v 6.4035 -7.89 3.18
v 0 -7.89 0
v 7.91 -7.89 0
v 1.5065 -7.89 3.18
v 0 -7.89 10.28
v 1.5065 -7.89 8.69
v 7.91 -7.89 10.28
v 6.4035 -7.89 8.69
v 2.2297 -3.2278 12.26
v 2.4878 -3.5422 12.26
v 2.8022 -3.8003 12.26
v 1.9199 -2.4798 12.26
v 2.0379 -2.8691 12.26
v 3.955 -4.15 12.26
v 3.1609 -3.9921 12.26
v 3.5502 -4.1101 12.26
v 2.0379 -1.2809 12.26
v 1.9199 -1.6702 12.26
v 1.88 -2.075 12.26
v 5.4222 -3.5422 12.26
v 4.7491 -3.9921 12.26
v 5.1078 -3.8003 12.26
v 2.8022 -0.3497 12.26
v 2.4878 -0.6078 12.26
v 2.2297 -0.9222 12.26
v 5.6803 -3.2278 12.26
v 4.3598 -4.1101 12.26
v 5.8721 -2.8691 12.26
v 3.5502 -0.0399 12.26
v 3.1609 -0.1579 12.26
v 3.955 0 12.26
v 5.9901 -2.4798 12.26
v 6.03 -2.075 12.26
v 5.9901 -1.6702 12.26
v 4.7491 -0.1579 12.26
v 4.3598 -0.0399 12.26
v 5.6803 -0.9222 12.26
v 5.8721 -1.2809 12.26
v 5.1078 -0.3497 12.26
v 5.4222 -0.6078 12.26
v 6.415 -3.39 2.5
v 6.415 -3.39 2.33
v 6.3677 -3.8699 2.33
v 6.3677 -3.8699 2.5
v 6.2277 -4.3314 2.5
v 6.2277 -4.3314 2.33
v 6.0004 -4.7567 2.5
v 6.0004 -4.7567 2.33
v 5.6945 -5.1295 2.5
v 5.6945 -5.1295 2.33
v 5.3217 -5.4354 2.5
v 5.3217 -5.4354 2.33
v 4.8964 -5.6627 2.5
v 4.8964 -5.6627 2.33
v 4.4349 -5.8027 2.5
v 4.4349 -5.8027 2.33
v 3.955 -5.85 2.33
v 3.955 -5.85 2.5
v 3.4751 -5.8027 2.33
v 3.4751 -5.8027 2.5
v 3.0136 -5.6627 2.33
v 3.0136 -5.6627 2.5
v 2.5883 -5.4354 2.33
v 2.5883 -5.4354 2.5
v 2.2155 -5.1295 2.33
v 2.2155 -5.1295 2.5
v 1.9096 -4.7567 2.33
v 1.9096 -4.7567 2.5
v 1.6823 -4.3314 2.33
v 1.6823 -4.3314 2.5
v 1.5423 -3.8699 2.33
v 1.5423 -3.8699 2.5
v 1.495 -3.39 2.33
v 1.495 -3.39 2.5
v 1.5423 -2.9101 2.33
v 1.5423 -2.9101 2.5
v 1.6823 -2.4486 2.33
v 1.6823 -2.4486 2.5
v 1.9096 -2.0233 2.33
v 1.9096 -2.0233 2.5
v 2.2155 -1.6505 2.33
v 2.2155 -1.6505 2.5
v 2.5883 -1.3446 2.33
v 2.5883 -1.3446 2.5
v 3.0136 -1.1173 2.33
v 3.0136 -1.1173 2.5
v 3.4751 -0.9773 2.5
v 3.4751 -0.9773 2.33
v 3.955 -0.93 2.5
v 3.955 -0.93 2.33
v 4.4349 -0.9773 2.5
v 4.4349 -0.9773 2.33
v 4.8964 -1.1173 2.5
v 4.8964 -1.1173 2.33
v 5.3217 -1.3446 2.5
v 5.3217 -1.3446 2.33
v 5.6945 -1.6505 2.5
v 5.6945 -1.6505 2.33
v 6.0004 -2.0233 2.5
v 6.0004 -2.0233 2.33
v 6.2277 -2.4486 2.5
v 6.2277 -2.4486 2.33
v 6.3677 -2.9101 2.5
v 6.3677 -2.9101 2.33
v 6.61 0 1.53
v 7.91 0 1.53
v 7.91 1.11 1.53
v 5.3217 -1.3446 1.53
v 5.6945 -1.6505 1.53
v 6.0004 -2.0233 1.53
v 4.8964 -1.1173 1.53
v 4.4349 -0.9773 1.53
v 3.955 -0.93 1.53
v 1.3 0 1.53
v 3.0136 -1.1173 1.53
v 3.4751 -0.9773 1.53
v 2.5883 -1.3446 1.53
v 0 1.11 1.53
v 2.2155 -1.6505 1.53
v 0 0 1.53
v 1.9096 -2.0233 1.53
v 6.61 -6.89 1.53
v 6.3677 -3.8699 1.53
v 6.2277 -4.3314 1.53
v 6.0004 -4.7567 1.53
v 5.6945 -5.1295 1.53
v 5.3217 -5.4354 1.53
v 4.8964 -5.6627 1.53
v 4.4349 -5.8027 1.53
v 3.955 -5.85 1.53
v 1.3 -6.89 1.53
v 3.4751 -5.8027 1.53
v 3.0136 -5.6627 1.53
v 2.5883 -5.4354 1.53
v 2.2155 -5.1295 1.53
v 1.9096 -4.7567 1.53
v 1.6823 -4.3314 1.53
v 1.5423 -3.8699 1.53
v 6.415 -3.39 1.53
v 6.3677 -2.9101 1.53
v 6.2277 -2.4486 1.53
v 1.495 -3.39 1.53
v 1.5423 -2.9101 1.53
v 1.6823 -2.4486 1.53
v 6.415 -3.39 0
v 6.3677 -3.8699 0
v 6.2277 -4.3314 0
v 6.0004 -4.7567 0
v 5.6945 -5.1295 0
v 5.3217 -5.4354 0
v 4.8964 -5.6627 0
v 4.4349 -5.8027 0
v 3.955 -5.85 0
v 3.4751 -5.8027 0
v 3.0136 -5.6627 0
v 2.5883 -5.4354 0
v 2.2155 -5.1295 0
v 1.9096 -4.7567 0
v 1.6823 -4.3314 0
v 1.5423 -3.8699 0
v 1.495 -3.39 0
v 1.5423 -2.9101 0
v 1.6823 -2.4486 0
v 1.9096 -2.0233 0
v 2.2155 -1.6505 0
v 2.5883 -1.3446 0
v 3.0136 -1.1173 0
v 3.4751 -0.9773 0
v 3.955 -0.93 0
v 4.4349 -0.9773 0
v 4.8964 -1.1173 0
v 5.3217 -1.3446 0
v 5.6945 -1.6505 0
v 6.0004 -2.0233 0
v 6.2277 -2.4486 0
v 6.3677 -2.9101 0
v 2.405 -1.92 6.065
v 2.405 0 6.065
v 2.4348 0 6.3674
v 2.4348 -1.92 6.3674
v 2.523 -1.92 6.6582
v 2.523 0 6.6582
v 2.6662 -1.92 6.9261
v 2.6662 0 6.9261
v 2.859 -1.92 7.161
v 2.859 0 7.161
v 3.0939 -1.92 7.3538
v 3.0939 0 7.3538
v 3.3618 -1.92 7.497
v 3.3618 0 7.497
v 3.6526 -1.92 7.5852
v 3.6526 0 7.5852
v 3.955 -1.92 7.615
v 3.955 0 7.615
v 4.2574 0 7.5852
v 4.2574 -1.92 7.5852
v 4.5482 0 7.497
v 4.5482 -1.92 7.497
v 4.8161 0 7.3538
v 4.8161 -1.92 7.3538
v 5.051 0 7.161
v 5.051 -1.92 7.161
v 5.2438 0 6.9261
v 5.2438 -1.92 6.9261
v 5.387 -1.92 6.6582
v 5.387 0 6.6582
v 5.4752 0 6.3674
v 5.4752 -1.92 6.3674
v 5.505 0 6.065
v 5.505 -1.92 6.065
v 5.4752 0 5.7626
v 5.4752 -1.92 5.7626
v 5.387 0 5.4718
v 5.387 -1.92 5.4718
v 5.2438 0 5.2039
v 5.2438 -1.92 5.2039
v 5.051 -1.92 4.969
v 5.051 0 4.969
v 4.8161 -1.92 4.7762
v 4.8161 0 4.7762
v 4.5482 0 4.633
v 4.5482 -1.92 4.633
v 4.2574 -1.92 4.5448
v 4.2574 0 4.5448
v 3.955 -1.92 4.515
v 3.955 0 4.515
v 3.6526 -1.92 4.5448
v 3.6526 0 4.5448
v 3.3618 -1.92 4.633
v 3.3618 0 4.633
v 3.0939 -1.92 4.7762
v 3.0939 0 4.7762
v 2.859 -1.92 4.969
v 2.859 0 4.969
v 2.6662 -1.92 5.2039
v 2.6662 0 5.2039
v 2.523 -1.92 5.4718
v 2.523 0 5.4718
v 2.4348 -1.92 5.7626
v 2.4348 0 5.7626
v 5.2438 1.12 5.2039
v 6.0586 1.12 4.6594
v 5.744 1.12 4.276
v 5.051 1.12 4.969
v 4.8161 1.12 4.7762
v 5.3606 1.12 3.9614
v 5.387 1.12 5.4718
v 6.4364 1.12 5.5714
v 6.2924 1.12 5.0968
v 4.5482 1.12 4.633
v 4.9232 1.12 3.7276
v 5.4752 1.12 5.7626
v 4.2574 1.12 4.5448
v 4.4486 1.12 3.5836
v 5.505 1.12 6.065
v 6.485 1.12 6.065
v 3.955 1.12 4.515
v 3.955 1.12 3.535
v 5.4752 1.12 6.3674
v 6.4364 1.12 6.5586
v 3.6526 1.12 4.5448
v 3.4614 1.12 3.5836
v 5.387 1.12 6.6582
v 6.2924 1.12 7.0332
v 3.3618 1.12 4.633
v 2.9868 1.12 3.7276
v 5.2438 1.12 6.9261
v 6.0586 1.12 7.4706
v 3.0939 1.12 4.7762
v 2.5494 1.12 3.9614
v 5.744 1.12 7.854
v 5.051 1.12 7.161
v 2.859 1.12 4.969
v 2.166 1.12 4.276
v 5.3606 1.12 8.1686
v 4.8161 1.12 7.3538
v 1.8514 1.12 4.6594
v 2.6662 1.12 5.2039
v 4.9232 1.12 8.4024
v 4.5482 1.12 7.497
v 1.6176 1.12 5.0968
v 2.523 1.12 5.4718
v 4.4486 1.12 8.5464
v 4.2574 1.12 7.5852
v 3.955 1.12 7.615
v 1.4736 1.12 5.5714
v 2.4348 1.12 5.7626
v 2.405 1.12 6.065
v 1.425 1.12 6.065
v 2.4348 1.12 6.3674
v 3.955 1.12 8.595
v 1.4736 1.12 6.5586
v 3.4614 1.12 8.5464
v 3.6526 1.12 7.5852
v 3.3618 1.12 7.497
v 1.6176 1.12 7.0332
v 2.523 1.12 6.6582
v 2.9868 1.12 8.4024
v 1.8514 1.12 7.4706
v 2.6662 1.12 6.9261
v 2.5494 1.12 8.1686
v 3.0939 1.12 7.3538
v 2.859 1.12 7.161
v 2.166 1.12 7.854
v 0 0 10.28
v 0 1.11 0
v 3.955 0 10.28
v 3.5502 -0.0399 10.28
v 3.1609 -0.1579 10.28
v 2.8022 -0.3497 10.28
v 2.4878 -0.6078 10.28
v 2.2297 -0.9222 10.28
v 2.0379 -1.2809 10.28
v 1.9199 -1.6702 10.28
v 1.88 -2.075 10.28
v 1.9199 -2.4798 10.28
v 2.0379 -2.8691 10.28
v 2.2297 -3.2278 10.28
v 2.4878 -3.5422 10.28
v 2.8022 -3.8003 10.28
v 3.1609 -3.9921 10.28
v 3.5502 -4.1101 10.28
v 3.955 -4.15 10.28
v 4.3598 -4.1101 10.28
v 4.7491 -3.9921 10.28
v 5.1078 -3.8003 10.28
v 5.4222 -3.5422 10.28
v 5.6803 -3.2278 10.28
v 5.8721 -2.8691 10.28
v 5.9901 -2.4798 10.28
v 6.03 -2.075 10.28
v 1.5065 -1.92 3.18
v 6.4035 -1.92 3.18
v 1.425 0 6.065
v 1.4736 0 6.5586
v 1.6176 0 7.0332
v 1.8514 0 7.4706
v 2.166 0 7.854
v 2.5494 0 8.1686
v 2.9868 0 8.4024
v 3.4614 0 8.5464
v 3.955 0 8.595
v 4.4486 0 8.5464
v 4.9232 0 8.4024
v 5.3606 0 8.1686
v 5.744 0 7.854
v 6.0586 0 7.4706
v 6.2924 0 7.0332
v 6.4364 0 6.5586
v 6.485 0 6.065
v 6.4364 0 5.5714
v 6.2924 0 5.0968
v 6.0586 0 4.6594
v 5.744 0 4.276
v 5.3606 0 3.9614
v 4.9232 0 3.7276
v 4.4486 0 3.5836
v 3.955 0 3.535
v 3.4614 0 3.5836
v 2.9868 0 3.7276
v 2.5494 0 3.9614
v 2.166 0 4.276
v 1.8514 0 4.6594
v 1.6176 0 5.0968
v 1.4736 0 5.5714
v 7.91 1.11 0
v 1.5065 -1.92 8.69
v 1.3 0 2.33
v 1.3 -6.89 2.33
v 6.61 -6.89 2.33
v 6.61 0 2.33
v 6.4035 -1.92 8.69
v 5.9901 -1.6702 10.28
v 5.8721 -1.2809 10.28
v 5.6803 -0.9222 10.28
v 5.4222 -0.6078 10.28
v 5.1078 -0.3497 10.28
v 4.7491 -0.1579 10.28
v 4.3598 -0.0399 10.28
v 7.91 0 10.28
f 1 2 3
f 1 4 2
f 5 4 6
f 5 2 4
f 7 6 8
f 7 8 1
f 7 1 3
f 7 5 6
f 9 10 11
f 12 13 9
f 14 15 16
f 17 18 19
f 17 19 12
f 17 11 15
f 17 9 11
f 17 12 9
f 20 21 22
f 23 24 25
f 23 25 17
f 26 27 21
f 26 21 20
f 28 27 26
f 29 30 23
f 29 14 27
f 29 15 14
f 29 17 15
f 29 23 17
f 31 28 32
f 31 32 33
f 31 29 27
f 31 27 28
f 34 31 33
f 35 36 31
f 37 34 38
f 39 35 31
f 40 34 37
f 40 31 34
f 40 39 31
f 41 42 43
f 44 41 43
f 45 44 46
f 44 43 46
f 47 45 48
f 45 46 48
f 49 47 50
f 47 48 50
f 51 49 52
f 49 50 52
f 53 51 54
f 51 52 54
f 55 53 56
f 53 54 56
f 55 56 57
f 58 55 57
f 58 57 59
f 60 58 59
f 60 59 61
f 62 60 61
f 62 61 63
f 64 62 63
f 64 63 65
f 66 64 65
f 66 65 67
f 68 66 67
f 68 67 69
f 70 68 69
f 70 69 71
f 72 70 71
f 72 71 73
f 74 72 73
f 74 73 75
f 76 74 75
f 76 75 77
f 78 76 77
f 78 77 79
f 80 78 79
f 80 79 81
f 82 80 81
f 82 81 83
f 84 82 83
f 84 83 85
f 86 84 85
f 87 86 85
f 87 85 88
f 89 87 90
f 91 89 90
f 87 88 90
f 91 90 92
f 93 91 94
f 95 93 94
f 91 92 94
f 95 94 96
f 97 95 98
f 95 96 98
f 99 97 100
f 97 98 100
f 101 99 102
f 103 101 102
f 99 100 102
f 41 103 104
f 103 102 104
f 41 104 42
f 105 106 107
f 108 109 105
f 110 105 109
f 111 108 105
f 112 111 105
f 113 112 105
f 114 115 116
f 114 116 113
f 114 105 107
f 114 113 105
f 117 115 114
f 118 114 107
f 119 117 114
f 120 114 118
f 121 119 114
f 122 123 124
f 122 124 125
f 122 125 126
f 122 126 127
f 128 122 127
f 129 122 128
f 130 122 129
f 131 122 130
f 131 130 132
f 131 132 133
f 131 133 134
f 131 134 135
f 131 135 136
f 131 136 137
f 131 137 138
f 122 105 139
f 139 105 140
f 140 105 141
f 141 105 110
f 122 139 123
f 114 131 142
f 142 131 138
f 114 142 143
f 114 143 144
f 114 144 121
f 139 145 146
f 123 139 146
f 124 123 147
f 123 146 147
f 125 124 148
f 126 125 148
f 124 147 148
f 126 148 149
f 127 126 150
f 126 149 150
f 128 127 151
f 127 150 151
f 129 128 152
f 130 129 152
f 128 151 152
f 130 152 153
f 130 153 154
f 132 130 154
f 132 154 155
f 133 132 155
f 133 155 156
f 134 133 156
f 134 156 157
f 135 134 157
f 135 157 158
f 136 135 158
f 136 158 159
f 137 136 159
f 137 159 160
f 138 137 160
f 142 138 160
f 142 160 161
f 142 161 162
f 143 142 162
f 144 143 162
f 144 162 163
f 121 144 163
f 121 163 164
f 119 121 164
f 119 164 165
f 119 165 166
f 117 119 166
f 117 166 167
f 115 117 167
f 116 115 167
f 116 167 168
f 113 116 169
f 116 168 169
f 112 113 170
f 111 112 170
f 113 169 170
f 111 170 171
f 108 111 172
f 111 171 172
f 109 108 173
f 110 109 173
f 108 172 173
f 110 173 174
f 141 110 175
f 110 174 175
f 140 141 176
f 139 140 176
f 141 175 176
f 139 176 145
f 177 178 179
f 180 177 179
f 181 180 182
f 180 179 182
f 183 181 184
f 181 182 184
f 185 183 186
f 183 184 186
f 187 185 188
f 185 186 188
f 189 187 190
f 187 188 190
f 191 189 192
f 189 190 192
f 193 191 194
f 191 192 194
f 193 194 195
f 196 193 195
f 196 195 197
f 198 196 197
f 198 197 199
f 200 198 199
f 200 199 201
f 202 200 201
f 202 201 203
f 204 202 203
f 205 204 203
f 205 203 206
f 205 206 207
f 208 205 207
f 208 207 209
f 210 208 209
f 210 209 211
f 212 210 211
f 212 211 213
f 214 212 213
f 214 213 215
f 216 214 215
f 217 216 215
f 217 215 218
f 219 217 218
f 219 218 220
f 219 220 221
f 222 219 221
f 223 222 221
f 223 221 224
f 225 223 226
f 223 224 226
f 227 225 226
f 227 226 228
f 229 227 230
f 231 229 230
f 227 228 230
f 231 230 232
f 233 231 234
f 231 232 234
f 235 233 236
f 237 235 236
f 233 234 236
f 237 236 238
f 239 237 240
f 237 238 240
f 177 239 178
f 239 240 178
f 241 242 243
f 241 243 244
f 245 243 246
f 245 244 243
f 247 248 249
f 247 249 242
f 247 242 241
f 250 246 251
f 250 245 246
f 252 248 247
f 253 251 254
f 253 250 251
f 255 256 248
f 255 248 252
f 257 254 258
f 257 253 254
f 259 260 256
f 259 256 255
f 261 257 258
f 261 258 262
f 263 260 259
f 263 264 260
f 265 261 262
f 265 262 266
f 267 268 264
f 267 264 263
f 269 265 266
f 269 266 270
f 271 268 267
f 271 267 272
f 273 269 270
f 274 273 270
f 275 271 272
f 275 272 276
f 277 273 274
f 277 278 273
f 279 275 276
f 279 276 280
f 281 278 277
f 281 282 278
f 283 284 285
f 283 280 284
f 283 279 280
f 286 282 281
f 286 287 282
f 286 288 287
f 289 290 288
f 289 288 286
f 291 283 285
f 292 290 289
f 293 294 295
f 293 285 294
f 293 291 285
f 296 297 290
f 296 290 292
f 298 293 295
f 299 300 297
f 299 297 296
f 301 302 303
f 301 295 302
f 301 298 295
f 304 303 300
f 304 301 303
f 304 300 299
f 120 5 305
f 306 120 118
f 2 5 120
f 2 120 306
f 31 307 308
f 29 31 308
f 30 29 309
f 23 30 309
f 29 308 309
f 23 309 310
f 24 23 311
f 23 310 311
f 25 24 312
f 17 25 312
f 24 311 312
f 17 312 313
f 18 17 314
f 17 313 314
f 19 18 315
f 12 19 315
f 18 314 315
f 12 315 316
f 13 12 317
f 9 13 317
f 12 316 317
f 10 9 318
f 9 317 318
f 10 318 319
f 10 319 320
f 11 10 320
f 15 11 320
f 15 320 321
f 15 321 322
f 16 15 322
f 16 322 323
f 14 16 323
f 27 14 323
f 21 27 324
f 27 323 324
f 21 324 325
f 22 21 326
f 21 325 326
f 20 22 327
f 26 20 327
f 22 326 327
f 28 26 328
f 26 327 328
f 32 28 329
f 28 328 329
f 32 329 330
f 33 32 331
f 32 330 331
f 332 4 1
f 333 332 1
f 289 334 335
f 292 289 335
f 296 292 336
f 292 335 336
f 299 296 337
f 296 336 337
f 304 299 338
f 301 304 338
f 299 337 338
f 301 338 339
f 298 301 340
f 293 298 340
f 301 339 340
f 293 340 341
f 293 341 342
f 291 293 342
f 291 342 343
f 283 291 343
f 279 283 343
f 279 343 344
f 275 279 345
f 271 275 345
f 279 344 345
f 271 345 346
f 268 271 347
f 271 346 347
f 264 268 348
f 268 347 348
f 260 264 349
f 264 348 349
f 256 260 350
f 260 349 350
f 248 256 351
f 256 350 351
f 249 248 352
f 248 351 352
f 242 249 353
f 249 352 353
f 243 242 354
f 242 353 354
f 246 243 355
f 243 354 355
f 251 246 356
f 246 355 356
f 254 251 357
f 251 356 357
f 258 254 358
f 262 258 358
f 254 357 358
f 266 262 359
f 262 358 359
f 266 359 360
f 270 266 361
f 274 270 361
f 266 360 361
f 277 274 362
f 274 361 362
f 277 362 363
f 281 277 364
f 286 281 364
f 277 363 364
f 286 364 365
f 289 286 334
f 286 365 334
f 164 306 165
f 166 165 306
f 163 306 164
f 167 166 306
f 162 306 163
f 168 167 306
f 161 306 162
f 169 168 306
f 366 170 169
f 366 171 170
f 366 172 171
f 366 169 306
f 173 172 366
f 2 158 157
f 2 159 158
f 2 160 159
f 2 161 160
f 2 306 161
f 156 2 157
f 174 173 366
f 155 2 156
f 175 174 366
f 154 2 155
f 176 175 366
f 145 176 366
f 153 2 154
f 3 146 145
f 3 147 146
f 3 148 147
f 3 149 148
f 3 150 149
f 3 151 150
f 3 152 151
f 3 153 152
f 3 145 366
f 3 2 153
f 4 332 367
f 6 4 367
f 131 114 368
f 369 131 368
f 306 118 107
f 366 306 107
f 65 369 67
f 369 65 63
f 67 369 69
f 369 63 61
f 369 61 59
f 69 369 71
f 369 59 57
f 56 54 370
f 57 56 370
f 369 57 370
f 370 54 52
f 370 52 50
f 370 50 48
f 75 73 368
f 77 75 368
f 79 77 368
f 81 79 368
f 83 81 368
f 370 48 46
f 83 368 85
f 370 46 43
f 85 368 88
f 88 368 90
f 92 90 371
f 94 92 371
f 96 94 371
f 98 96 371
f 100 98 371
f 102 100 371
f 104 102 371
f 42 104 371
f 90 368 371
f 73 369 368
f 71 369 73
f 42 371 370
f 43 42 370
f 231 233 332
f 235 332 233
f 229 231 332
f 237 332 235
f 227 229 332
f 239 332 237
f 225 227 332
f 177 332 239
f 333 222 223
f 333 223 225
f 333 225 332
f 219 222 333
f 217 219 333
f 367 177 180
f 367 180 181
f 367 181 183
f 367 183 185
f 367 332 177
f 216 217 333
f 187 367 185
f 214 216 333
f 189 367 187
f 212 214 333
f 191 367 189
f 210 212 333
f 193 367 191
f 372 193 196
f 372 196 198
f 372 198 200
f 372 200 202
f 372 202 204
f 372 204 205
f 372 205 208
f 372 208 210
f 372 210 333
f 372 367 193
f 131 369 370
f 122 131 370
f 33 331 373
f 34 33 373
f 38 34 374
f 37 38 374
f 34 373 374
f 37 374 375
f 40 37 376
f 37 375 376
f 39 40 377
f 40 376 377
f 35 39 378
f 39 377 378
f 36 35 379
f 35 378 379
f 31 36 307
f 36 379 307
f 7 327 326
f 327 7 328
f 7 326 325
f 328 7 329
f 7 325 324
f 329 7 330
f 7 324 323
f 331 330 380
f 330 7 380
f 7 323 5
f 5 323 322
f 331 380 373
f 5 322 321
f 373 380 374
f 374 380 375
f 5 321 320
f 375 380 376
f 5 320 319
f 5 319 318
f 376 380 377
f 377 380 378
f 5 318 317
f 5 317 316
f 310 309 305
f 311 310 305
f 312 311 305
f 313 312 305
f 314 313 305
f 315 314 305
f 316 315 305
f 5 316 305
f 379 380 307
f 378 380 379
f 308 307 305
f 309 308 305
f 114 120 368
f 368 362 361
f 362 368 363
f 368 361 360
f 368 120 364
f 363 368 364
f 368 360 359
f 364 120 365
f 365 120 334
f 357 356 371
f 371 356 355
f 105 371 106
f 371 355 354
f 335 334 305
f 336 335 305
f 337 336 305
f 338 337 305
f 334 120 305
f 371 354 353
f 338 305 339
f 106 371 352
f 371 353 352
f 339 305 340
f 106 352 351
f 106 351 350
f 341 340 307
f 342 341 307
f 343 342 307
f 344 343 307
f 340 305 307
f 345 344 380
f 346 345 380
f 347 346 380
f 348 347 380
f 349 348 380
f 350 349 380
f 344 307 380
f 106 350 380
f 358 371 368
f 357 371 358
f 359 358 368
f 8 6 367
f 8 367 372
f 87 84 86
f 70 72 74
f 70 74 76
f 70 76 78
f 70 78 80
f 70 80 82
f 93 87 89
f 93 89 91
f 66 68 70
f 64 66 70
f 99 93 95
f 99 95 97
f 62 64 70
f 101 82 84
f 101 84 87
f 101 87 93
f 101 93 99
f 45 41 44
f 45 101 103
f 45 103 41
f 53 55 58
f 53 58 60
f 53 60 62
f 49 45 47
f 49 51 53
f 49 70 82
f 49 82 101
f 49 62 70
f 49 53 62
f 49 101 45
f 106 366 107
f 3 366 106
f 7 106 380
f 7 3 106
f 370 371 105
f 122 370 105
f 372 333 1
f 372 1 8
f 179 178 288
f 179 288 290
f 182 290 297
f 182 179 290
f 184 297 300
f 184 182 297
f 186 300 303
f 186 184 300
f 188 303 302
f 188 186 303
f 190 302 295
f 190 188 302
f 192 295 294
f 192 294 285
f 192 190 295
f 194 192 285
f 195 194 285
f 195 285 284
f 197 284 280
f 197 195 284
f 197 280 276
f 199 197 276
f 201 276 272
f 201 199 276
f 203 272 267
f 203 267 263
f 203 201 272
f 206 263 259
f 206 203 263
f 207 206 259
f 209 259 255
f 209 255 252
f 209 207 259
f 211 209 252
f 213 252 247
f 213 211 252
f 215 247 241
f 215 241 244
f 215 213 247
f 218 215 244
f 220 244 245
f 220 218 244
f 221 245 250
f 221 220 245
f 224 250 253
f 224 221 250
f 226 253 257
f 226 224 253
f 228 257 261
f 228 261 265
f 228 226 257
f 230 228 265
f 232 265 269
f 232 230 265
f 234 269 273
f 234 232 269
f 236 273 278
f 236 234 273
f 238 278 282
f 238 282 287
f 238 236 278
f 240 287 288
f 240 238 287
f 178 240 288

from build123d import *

# Parameters (mm, degrees)
F1_DEPTH  = 7.89
F3_DEPTH  = 9
F4_R      = 1.55
F5_DEPTH  = 25
F6_DEPTH  = 33
F7_R      = 2.53
F7_R_2    = 1.55
F8_DEPTH  = 1.12
F10_DEPTH = 1.98
F11_W     = 5.31
F11_H     = 0.8
F12_DEPTH = 1
F13_W     = 4.8969178084
F13_H     = 5.51
F14_DEPTH = 5.97
F15_R     = 2.46
F16_DEPTH = 2.5


with BuildPart() as f1:
    # F0 (on Front) → F1 (new body)
    with BuildSketch(Plane.XZ):
        Polygon((0, 10.28), (0, 1.53), (1.3, 1.53), (1.3, 2.33), (6.61, 2.33), (6.61, 1.53), (7.91, 1.53), (7.91, 10.28), align=None)
    extrude(amount=F1_DEPTH)

    # F2 (on face) → F3 (join)
    with BuildSketch(Plane.XZ.offset(7.89)):
        Polygon((1.3, 1.53), (0, 1.53), (0, 0), (7.91, 0), (7.91, 1.53), (6.61, 1.53), align=None)
    extrude(amount=-F3_DEPTH)

    # F4 (on face) → F5 (join)
    with BuildSketch(Plane(origin=(0, 0, 0), x_dir=(-1, 0, 0), z_dir=(0, 1, 0))):
        with Locations((-3.955, 6.065)):
            Circle(F4_R)
    extrude(amount=F5_DEPTH)

    # F6 (cut): a face of the model
    f6_faces = [f1.faces().sort_by_distance(p)[0] for p in [
        (3.955, 25, 6.065),
    ]]
    extrude(f6_faces, amount=-F6_DEPTH, mode=Mode.SUBTRACT)

    # F7 (on face) → F8 (join)
    with BuildSketch(Plane(origin=(0, 0, 0), x_dir=(-1, 0, 0), z_dir=(0, 1, 0))):
        with Locations((-3.955, 6.065)):
            Circle(F7_R)
        with Locations((-3.955, 6.065)):
            Circle(F7_R_2, mode=Mode.SUBTRACT)
    extrude(amount=F8_DEPTH)

    # F9 (on face) → F10 (join)
    with BuildSketch(Plane.XY.offset(10.28)):
        with BuildLine():
            ThreePointArc((3.955, 0), (2.487753429, -3.542246571), (6.03, -2.075))
            ThreePointArc((6.03, -2.075), (5.422246571, -0.607753429), (3.955, 0))
        make_face()
    extrude(amount=F10_DEPTH)

    # F11 (on face) → F12 (join)
    with BuildSketch(Plane.XZ.offset(7.89)):
        with Locations((3.955, 1.93)):
            Rectangle(F11_W, F11_H)
    extrude(amount=-F12_DEPTH)

    # F13 (on face) → F14 (cut)
    with BuildSketch(Plane.XZ.offset(7.89)):
        with Locations((3.955, 5.935)):
            Rectangle(F13_W, F13_H)
    extrude(amount=-F14_DEPTH, mode=Mode.SUBTRACT)

    # F15 (on face) → F16 (cut)
    with BuildSketch(Plane(origin=(0, 0, 0), x_dir=(1, 0, 0), z_dir=(0, 0, -1))):
        with Locations((3.955, 3.39)):
            Circle(F15_R)
    extrude(amount=-F16_DEPTH, mode=Mode.SUBTRACT)


solid = f1.part
